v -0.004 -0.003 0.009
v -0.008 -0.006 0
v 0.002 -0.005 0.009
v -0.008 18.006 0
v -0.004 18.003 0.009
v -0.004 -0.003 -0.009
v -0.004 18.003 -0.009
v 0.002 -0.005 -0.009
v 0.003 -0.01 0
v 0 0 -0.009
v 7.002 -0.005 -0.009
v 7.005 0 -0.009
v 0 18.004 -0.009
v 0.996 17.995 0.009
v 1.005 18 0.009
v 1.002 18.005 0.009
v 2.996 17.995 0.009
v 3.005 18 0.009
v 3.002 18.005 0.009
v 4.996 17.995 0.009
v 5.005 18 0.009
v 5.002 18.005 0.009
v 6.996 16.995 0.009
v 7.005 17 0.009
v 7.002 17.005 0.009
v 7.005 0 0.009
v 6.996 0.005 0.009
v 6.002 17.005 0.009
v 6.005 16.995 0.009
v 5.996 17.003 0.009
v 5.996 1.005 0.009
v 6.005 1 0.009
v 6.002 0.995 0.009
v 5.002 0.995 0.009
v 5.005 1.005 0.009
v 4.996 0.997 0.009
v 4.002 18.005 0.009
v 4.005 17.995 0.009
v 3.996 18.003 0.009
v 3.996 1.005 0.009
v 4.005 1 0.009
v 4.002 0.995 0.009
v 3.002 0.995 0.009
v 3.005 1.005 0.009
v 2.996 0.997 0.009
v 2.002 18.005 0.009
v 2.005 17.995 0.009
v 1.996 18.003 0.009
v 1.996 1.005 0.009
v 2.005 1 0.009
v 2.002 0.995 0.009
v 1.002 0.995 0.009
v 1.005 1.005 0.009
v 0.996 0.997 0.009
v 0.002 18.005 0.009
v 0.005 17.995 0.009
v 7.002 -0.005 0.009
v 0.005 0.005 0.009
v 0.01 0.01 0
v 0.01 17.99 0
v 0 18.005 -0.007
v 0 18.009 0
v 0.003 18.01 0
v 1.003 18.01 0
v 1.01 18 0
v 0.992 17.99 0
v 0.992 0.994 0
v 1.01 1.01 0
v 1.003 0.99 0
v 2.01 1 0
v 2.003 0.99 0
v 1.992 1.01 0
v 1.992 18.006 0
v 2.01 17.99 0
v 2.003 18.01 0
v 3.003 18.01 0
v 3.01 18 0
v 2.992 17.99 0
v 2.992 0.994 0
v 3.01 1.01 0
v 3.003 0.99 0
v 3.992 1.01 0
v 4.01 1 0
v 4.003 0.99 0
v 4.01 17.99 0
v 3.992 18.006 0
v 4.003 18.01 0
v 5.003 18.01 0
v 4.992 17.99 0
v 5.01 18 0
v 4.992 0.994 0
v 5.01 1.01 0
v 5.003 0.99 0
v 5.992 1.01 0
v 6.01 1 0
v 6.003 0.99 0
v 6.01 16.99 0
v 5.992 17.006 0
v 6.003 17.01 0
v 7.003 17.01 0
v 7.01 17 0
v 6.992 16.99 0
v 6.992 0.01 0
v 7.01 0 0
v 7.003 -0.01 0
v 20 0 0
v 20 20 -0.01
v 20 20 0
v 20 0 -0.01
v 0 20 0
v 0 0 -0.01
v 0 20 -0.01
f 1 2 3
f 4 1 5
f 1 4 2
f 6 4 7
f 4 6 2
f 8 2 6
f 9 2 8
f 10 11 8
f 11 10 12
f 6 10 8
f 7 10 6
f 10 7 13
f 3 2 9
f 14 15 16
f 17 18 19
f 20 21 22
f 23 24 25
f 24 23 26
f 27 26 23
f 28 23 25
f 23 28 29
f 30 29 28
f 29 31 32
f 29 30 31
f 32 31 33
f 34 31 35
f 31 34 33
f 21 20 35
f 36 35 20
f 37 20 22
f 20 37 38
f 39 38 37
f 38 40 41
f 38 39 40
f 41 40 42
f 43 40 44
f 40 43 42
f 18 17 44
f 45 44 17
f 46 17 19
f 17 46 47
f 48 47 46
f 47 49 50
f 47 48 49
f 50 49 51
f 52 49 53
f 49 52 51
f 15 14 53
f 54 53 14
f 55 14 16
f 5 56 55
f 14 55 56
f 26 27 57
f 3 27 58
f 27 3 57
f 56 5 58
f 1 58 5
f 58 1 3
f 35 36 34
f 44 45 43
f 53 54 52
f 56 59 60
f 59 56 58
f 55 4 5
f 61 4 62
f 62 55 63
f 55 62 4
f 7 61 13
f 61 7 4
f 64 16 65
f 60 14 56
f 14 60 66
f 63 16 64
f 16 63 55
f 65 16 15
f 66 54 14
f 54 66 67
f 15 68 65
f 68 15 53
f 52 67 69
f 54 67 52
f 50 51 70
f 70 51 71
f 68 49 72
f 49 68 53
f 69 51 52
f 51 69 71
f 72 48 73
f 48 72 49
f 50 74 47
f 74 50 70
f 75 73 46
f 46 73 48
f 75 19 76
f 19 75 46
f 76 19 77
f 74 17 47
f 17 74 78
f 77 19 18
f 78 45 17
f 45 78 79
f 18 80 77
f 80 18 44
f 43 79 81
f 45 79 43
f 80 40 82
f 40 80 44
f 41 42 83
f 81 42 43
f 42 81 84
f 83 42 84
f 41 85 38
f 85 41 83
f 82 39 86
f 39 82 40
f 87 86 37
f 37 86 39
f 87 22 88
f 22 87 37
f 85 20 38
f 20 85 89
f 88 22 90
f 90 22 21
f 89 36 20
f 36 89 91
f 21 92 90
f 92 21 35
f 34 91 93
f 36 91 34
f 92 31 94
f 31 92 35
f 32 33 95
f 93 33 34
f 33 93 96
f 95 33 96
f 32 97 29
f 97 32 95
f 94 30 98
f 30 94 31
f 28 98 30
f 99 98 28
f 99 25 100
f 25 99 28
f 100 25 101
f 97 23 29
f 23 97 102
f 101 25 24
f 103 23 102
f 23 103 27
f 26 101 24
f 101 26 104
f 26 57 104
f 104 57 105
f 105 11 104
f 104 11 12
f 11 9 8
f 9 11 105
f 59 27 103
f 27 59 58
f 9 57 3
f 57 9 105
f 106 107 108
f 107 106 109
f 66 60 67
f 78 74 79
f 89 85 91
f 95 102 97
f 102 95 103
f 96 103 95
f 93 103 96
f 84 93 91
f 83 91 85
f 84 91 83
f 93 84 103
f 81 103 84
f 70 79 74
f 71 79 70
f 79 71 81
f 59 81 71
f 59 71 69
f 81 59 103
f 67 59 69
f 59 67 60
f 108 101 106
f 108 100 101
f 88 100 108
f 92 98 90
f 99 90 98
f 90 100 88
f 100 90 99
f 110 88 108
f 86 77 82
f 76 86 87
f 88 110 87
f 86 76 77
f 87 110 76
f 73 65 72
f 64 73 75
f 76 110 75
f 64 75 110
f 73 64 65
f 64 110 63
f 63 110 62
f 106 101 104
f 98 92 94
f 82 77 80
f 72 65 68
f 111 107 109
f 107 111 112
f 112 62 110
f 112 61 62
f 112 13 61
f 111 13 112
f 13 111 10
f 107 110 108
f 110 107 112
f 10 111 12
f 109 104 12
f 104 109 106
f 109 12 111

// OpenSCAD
hull(){
    translate([0, 0]) sphere(0.01);
    translate([0, 1]) sphere(0.01);
}
hull(){
    translate([0, 1]) sphere(0.01);
    translate([0, 2]) sphere(0.01);
}
hull(){
    translate([0, 2]) sphere(0.01);
    translate([0, 3]) sphere(0.01);
}
hull(){
    translate([0, 3]) sphere(0.01);
    translate([0, 4]) sphere(0.01);
}
hull(){
    translate([0, 4]) sphere(0.01);
    translate([0, 5]) sphere(0.01);
}
hull(){
    translate([0, 5]) sphere(0.01);
    translate([0, 6]) sphere(0.01);
}
hull(){
    translate([0, 6]) sphere(0.01);
    translate([0, 7]) sphere(0.01);
}
hull(){
    translate([0, 7]) sphere(0.01);
    translate([0, 8]) sphere(0.01);
}
hull(){
    translate([0, 8]) sphere(0.01);
    translate([0, 9]) sphere(0.01);
}
hull(){
    translate([0, 9]) sphere(0.01);
    translate([0, 10]) sphere(0.01);
}
hull(){
    translate([0, 10]) sphere(0.01);
    translate([0, 11]) sphere(0.01);
}
hull(){
    translate([0, 11]) sphere(0.01);
    translate([0, 12]) sphere(0.01);
}
hull(){
    translate([0, 12]) sphere(0.01);
    translate([0, 13]) sphere(0.01);
}
hull(){
    translate([0, 13]) sphere(0.01);
    translate([0, 14]) sphere(0.01);
}
hull(){
    translate([0, 14]) sphere(0.01);
    translate([0, 15]) sphere(0.01);
}
hull(){
    translate([0, 15]) sphere(0.01);
    translate([0, 16]) sphere(0.01);
}
hull(){
    translate([0, 16]) sphere(0.01);
    translate([0, 17]) sphere(0.01);
}
hull(){
    translate([0, 17]) sphere(0.01);
    translate([0, 18]) sphere(0.01);
}
hull(){
    translate([0, 18]) sphere(0.01);
    translate([1, 18]) sphere(0.01);
}
hull(){
    translate([1, 18]) sphere(0.01);
    translate([1, 17]) sphere(0.01);
}
hull(){
    translate([1, 17]) sphere(0.01);
    translate([1, 16]) sphere(0.01);
}
hull(){
    translate([1, 16]) sphere(0.01);
    translate([1, 15]) sphere(0.01);
}
hull(){
    translate([1, 15]) sphere(0.01);
    translate([1, 14]) sphere(0.01);
}
hull(){
    translate([1, 14]) sphere(0.01);
    translate([1, 13]) sphere(0.01);
}
hull(){
    translate([1, 13]) sphere(0.01);
    translate([1, 12]) sphere(0.01);
}
hull(){
    translate([1, 12]) sphere(0.01);
    translate([1, 11]) sphere(0.01);
}
hull(){
    translate([1, 11]) sphere(0.01);
    translate([1, 10]) sphere(0.01);
}
hull(){
    translate([1, 10]) sphere(0.01);
    translate([1, 9]) sphere(0.01);
}
hull(){
    translate([1, 9]) sphere(0.01);
    translate([1, 8]) sphere(0.01);
}
hull(){
    translate([1, 8]) sphere(0.01);
    translate([1, 7]) sphere(0.01);
}
hull(){
    translate([1, 7]) sphere(0.01);
    translate([1, 6]) sphere(0.01);
}
hull(){
    translate([1, 6]) sphere(0.01);
    translate([1, 5]) sphere(0.01);
}
hull(){
    translate([1, 5]) sphere(0.01);
    translate([1, 4]) sphere(0.01);
}
hull(){
    translate([1, 4]) sphere(0.01);
    translate([1, 3]) sphere(0.01);
}
hull(){
    translate([1, 3]) sphere(0.01);
    translate([1, 2]) sphere(0.01);
}
hull(){
    translate([1, 2]) sphere(0.01);
    translate([1, 1]) sphere(0.01);
}
hull(){
    translate([1, 1]) sphere(0.01);
    translate([2, 1]) sphere(0.01);
}
hull(){
    translate([2, 1]) sphere(0.01);
    translate([2, 2]) sphere(0.01);
}
hull(){
    translate([2, 2]) sphere(0.01);
    translate([2, 3]) sphere(0.01);
}
hull(){
    translate([2, 3]) sphere(0.01);
    translate([2, 4]) sphere(0.01);
}
hull(){
    translate([2, 4]) sphere(0.01);
    translate([2, 5]) sphere(0.01);
}
hull(){
    translate([2, 5]) sphere(0.01);
    translate([2, 6]) sphere(0.01);
}
hull(){
    translate([2, 6]) sphere(0.01);
    translate([2, 7]) sphere(0.01);
}
hull(){
    translate([2, 7]) sphere(0.01);
    translate([2, 8]) sphere(0.01);
}
hull(){
    translate([2, 8]) sphere(0.01);
    translate([2, 9]) sphere(0.01);
}
hull(){
    translate([2, 9]) sphere(0.01);
    translate([2, 10]) sphere(0.01);
}
hull(){
    translate([2, 10]) sphere(0.01);
    translate([2, 11]) sphere(0.01);
}
hull(){
    translate([2, 11]) sphere(0.01);
    translate([2, 12]) sphere(0.01);
}
hull(){
    translate([2, 12]) sphere(0.01);
    translate([2, 13]) sphere(0.01);
}
hull(){
    translate([2, 13]) sphere(0.01);
    translate([2, 14]) sphere(0.01);
}
hull(){
    translate([2, 14]) sphere(0.01);
    translate([2, 15]) sphere(0.01);
}
hull(){
    translate([2, 15]) sphere(0.01);
    translate([2, 16]) sphere(0.01);
}
hull(){
    translate([2, 16]) sphere(0.01);
    translate([2, 17]) sphere(0.01);
}
hull(){
    translate([2, 17]) sphere(0.01);
    translate([2, 18]) sphere(0.01);
}
hull(){
    translate([2, 18]) sphere(0.01);
    translate([3, 18]) sphere(0.01);
}
hull(){
    translate([3, 18]) sphere(0.01);
    translate([3, 17]) sphere(0.01);
}
hull(){
    translate([3, 17]) sphere(0.01);
    translate([3, 16]) sphere(0.01);
}
hull(){
    translate([3, 16]) sphere(0.01);
    translate([3, 15]) sphere(0.01);
}
hull(){
    translate([3, 15]) sphere(0.01);
    translate([3, 14]) sphere(0.01);
}
hull(){
    translate([3, 14]) sphere(0.01);
    translate([3, 13]) sphere(0.01);
}
hull(){
    translate([3, 13]) sphere(0.01);
    translate([3, 12]) sphere(0.01);
}
hull(){
    translate([3, 12]) sphere(0.01);
    translate([3, 11]) sphere(0.01);
}
hull(){
    translate([3, 11]) sphere(0.01);
    translate([3, 10]) sphere(0.01);
}
hull(){
    translate([3, 10]) sphere(0.01);
    translate([3, 9]) sphere(0.01);
}
hull(){
    translate([3, 9]) sphere(0.01);
    translate([3, 8]) sphere(0.01);
}
hull(){
    translate([3, 8]) sphere(0.01);
    translate([3, 7]) sphere(0.01);
}
hull(){
    translate([3, 7]) sphere(0.01);
    translate([3, 6]) sphere(0.01);
}
hull(){
    translate([3, 6]) sphere(0.01);
    translate([3, 5]) sphere(0.01);
}
hull(){
    translate([3, 5]) sphere(0.01);
    translate([3, 4]) sphere(0.01);
}
hull(){
    translate([3, 4]) sphere(0.01);
    translate([3, 3]) sphere(0.01);
}
hull(){
    translate([3, 3]) sphere(0.01);
    translate([3, 2]) sphere(0.01);
}
hull(){
    translate([3, 2]) sphere(0.01);
    translate([3, 1]) sphere(0.01);
}
hull(){
    translate([3, 1]) sphere(0.01);
    translate([4, 1]) sphere(0.01);
}
hull(){
    translate([4, 1]) sphere(0.01);
    translate([4, 2]) sphere(0.01);
}
hull(){
    translate([4, 2]) sphere(0.01);
    translate([4, 3]) sphere(0.01);
}
hull(){
    translate([4, 3]) sphere(0.01);
    translate([4, 4]) sphere(0.01);
}
hull(){
    translate([4, 4]) sphere(0.01);
    translate([4, 5]) sphere(0.01);
}
hull(){
    translate([4, 5]) sphere(0.01);
    translate([4, 6]) sphere(0.01);
}
hull(){
    translate([4, 6]) sphere(0.01);
    translate([4, 7]) sphere(0.01);
}
hull(){
    translate([4, 7]) sphere(0.01);
    translate([4, 8]) sphere(0.01);
}
hull(){
    translate([4, 8]) sphere(0.01);
    translate([4, 9]) sphere(0.01);
}
hull(){
    translate([4, 9]) sphere(0.01);
    translate([4, 10]) sphere(0.01);
}
hull(){
    translate([4, 10]) sphere(0.01);
    translate([4, 11]) sphere(0.01);
}
hull(){
    translate([4, 11]) sphere(0.01);
    translate([4, 12]) sphere(0.01);
}
hull(){
    translate([4, 12]) sphere(0.01);
    translate([4, 13]) sphere(0.01);
}
hull(){
    translate([4, 13]) sphere(0.01);
    translate([4, 14]) sphere(0.01);
}
hull(){
    translate([4, 14]) sphere(0.01);
    translate([4, 15]) sphere(0.01);
}
hull(){
    translate([4, 15]) sphere(0.01);
    translate([4, 16]) sphere(0.01);
}
hull(){
    translate([4, 16]) sphere(0.01);
    translate([4, 17]) sphere(0.01);
}
hull(){
    translate([4, 17]) sphere(0.01);
    translate([4, 18]) sphere(0.01);
}
hull(){
    translate([4, 18]) sphere(0.01);
    translate([5, 18]) sphere(0.01);
}
hull(){
    translate([5, 18]) sphere(0.01);
    translate([5, 17]) sphere(0.01);
}
hull(){
    translate([5, 17]) sphere(0.01);
    translate([5, 16]) sphere(0.01);
}
hull(){
    translate([5, 16]) sphere(0.01);
    translate([5, 15]) sphere(0.01);
}
hull(){
    translate([5, 15]) sphere(0.01);
    translate([5, 14]) sphere(0.01);
}
hull(){
    translate([5, 14]) sphere(0.01);
    translate([5, 13]) sphere(0.01);
}
hull(){
    translate([5, 13]) sphere(0.01);
    translate([5, 12]) sphere(0.01);
}
hull(){
    translate([5, 12]) sphere(0.01);
    translate([5, 11]) sphere(0.01);
}
hull(){
    translate([5, 11]) sphere(0.01);
    translate([5, 10]) sphere(0.01);
}
hull(){
    translate([5, 10]) sphere(0.01);
    translate([5, 9]) sphere(0.01);
}
hull(){
    translate([5, 9]) sphere(0.01);
    translate([5, 8]) sphere(0.01);
}
hull(){
    translate([5, 8]) sphere(0.01);
    translate([5, 7]) sphere(0.01);
}
hull(){
    translate([5, 7]) sphere(0.01);
    translate([5, 6]) sphere(0.01);
}
hull(){
    translate([5, 6]) sphere(0.01);
    translate([5, 5]) sphere(0.01);
}
hull(){
    translate([5, 5]) sphere(0.01);
    translate([5, 4]) sphere(0.01);
}
hull(){
    translate([5, 4]) sphere(0.01);
    translate([5, 3]) sphere(0.01);
}
hull(){
    translate([5, 3]) sphere(0.01);
    translate([5, 2]) sphere(0.01);
}
hull(){
    translate([5, 2]) sphere(0.01);
    translate([5, 1]) sphere(0.01);
}
hull(){
    translate([5, 1]) sphere(0.01);
    translate([6, 1]) sphere(0.01);
}
hull(){
    translate([6, 1]) sphere(0.01);
    translate([6, 2]) sphere(0.01);
}
hull(){
    translate([6, 2]) sphere(0.01);
    translate([6, 3]) sphere(0.01);
}
hull(){
    translate([6, 3]) sphere(0.01);
    translate([6, 4]) sphere(0.01);
}
hull(){
    translate([6, 4]) sphere(0.01);
    translate([6, 5]) sphere(0.01);
}
hull(){
    translate([6, 5]) sphere(0.01);
    translate([6, 6]) sphere(0.01);
}
hull(){
    translate([6, 6]) sphere(0.01);
    translate([6, 7]) sphere(0.01);
}
hull(){
    translate([6, 7]) sphere(0.01);
    translate([6, 8]) sphere(0.01);
}
hull(){
    translate([6, 8]) sphere(0.01);
    translate([6, 9]) sphere(0.01);
}
hull(){
    translate([6, 9]) sphere(0.01);
    translate([6, 10]) sphere(0.01);
}
hull(){
    translate([6, 10]) sphere(0.01);
    translate([6, 11]) sphere(0.01);
}
hull(){
    translate([6, 11]) sphere(0.01);
    translate([6, 12]) sphere(0.01);
}
hull(){
    translate([6, 12]) sphere(0.01);
    translate([6, 13]) sphere(0.01);
}
hull(){
    translate([6, 13]) sphere(0.01);
    translate([6, 14]) sphere(0.01);
}
hull(){
    translate([6, 14]) sphere(0.01);
    translate([6, 15]) sphere(0.01);
}
hull(){
    translate([6, 15]) sphere(0.01);
    translate([6, 16]) sphere(0.01);
}
hull(){
    translate([6, 16]) sphere(0.01);
    translate([6, 17]) sphere(0.01);
}
hull(){
    translate([6, 17]) sphere(0.01);
    translate([7, 17]) sphere(0.01);
}
hull(){
    translate([7, 17]) sphere(0.01);
    translate([7, 16]) sphere(0.01);
}
hull(){
    translate([7, 16]) sphere(0.01);
    translate([7, 15]) sphere(0.01);
}
hull(){
    translate([7, 15]) sphere(0.01);
    translate([7, 14]) sphere(0.01);
}
hull(){
    translate([7, 14]) sphere(0.01);
    translate([7, 13]) sphere(0.01);
}
hull(){
    translate([7, 13]) sphere(0.01);
    translate([7, 12]) sphere(0.01);
}
hull(){
    translate([7, 12]) sphere(0.01);
    translate([7, 11]) sphere(0.01);
}
hull(){
    translate([7, 11]) sphere(0.01);
    translate([7, 10]) sphere(0.01);
}
hull(){
    translate([7, 10]) sphere(0.01);
    translate([7, 9]) sphere(0.01);
}
hull(){
    translate([7, 9]) sphere(0.01);
    translate([7, 8]) sphere(0.01);
}
hull(){
    translate([7, 8]) sphere(0.01);
    translate([7, 7]) sphere(0.01);
}
hull(){
    translate([7, 7]) sphere(0.01);
    translate([7, 6]) sphere(0.01);
}
hull(){
    translate([7, 6]) sphere(0.01);
    translate([7, 5]) sphere(0.01);
}
hull(){
    translate([7, 5]) sphere(0.01);
    translate([7, 4]) sphere(0.01);
}
hull(){
    translate([7, 4]) sphere(0.01);
    translate([7, 3]) sphere(0.01);
}
hull(){
    translate([7, 3]) sphere(0.01);
    translate([7, 2]) sphere(0.01);
}
hull(){
    translate([7, 2]) sphere(0.01);
    translate([7, 1]) sphere(0.01);
}
hull(){
    translate([7, 1]) sphere(0.01);
    translate([7, 0]) sphere(0.01);
}
hull(){
    translate([7, 0]) sphere(0.01);
    translate([6, 0]) sphere(0.01);
}
hull(){
    translate([6, 0]) sphere(0.01);
    translate([5, 0]) sphere(0.01);
}
hull(){
    translate([5, 0]) sphere(0.01);
    translate([4, 0]) sphere(0.01);
}
hull(){
    translate([4, 0]) sphere(0.01);
    translate([3, 0]) sphere(0.01);
}
hull(){
    translate([3, 0]) sphere(0.01);
    translate([2, 0]) sphere(0.01);
}
hull(){
    translate([2, 0]) sphere(0.01);
    translate([1, 0]) sphere(0.01);
}
hull(){
    translate([1, 0]) sphere(0.01);
    translate([0, 0]) sphere(0.01);
}
translate([0,0,-0.01]) color([0.1,0.1,0.1]) cube([20,20,0.01]);
